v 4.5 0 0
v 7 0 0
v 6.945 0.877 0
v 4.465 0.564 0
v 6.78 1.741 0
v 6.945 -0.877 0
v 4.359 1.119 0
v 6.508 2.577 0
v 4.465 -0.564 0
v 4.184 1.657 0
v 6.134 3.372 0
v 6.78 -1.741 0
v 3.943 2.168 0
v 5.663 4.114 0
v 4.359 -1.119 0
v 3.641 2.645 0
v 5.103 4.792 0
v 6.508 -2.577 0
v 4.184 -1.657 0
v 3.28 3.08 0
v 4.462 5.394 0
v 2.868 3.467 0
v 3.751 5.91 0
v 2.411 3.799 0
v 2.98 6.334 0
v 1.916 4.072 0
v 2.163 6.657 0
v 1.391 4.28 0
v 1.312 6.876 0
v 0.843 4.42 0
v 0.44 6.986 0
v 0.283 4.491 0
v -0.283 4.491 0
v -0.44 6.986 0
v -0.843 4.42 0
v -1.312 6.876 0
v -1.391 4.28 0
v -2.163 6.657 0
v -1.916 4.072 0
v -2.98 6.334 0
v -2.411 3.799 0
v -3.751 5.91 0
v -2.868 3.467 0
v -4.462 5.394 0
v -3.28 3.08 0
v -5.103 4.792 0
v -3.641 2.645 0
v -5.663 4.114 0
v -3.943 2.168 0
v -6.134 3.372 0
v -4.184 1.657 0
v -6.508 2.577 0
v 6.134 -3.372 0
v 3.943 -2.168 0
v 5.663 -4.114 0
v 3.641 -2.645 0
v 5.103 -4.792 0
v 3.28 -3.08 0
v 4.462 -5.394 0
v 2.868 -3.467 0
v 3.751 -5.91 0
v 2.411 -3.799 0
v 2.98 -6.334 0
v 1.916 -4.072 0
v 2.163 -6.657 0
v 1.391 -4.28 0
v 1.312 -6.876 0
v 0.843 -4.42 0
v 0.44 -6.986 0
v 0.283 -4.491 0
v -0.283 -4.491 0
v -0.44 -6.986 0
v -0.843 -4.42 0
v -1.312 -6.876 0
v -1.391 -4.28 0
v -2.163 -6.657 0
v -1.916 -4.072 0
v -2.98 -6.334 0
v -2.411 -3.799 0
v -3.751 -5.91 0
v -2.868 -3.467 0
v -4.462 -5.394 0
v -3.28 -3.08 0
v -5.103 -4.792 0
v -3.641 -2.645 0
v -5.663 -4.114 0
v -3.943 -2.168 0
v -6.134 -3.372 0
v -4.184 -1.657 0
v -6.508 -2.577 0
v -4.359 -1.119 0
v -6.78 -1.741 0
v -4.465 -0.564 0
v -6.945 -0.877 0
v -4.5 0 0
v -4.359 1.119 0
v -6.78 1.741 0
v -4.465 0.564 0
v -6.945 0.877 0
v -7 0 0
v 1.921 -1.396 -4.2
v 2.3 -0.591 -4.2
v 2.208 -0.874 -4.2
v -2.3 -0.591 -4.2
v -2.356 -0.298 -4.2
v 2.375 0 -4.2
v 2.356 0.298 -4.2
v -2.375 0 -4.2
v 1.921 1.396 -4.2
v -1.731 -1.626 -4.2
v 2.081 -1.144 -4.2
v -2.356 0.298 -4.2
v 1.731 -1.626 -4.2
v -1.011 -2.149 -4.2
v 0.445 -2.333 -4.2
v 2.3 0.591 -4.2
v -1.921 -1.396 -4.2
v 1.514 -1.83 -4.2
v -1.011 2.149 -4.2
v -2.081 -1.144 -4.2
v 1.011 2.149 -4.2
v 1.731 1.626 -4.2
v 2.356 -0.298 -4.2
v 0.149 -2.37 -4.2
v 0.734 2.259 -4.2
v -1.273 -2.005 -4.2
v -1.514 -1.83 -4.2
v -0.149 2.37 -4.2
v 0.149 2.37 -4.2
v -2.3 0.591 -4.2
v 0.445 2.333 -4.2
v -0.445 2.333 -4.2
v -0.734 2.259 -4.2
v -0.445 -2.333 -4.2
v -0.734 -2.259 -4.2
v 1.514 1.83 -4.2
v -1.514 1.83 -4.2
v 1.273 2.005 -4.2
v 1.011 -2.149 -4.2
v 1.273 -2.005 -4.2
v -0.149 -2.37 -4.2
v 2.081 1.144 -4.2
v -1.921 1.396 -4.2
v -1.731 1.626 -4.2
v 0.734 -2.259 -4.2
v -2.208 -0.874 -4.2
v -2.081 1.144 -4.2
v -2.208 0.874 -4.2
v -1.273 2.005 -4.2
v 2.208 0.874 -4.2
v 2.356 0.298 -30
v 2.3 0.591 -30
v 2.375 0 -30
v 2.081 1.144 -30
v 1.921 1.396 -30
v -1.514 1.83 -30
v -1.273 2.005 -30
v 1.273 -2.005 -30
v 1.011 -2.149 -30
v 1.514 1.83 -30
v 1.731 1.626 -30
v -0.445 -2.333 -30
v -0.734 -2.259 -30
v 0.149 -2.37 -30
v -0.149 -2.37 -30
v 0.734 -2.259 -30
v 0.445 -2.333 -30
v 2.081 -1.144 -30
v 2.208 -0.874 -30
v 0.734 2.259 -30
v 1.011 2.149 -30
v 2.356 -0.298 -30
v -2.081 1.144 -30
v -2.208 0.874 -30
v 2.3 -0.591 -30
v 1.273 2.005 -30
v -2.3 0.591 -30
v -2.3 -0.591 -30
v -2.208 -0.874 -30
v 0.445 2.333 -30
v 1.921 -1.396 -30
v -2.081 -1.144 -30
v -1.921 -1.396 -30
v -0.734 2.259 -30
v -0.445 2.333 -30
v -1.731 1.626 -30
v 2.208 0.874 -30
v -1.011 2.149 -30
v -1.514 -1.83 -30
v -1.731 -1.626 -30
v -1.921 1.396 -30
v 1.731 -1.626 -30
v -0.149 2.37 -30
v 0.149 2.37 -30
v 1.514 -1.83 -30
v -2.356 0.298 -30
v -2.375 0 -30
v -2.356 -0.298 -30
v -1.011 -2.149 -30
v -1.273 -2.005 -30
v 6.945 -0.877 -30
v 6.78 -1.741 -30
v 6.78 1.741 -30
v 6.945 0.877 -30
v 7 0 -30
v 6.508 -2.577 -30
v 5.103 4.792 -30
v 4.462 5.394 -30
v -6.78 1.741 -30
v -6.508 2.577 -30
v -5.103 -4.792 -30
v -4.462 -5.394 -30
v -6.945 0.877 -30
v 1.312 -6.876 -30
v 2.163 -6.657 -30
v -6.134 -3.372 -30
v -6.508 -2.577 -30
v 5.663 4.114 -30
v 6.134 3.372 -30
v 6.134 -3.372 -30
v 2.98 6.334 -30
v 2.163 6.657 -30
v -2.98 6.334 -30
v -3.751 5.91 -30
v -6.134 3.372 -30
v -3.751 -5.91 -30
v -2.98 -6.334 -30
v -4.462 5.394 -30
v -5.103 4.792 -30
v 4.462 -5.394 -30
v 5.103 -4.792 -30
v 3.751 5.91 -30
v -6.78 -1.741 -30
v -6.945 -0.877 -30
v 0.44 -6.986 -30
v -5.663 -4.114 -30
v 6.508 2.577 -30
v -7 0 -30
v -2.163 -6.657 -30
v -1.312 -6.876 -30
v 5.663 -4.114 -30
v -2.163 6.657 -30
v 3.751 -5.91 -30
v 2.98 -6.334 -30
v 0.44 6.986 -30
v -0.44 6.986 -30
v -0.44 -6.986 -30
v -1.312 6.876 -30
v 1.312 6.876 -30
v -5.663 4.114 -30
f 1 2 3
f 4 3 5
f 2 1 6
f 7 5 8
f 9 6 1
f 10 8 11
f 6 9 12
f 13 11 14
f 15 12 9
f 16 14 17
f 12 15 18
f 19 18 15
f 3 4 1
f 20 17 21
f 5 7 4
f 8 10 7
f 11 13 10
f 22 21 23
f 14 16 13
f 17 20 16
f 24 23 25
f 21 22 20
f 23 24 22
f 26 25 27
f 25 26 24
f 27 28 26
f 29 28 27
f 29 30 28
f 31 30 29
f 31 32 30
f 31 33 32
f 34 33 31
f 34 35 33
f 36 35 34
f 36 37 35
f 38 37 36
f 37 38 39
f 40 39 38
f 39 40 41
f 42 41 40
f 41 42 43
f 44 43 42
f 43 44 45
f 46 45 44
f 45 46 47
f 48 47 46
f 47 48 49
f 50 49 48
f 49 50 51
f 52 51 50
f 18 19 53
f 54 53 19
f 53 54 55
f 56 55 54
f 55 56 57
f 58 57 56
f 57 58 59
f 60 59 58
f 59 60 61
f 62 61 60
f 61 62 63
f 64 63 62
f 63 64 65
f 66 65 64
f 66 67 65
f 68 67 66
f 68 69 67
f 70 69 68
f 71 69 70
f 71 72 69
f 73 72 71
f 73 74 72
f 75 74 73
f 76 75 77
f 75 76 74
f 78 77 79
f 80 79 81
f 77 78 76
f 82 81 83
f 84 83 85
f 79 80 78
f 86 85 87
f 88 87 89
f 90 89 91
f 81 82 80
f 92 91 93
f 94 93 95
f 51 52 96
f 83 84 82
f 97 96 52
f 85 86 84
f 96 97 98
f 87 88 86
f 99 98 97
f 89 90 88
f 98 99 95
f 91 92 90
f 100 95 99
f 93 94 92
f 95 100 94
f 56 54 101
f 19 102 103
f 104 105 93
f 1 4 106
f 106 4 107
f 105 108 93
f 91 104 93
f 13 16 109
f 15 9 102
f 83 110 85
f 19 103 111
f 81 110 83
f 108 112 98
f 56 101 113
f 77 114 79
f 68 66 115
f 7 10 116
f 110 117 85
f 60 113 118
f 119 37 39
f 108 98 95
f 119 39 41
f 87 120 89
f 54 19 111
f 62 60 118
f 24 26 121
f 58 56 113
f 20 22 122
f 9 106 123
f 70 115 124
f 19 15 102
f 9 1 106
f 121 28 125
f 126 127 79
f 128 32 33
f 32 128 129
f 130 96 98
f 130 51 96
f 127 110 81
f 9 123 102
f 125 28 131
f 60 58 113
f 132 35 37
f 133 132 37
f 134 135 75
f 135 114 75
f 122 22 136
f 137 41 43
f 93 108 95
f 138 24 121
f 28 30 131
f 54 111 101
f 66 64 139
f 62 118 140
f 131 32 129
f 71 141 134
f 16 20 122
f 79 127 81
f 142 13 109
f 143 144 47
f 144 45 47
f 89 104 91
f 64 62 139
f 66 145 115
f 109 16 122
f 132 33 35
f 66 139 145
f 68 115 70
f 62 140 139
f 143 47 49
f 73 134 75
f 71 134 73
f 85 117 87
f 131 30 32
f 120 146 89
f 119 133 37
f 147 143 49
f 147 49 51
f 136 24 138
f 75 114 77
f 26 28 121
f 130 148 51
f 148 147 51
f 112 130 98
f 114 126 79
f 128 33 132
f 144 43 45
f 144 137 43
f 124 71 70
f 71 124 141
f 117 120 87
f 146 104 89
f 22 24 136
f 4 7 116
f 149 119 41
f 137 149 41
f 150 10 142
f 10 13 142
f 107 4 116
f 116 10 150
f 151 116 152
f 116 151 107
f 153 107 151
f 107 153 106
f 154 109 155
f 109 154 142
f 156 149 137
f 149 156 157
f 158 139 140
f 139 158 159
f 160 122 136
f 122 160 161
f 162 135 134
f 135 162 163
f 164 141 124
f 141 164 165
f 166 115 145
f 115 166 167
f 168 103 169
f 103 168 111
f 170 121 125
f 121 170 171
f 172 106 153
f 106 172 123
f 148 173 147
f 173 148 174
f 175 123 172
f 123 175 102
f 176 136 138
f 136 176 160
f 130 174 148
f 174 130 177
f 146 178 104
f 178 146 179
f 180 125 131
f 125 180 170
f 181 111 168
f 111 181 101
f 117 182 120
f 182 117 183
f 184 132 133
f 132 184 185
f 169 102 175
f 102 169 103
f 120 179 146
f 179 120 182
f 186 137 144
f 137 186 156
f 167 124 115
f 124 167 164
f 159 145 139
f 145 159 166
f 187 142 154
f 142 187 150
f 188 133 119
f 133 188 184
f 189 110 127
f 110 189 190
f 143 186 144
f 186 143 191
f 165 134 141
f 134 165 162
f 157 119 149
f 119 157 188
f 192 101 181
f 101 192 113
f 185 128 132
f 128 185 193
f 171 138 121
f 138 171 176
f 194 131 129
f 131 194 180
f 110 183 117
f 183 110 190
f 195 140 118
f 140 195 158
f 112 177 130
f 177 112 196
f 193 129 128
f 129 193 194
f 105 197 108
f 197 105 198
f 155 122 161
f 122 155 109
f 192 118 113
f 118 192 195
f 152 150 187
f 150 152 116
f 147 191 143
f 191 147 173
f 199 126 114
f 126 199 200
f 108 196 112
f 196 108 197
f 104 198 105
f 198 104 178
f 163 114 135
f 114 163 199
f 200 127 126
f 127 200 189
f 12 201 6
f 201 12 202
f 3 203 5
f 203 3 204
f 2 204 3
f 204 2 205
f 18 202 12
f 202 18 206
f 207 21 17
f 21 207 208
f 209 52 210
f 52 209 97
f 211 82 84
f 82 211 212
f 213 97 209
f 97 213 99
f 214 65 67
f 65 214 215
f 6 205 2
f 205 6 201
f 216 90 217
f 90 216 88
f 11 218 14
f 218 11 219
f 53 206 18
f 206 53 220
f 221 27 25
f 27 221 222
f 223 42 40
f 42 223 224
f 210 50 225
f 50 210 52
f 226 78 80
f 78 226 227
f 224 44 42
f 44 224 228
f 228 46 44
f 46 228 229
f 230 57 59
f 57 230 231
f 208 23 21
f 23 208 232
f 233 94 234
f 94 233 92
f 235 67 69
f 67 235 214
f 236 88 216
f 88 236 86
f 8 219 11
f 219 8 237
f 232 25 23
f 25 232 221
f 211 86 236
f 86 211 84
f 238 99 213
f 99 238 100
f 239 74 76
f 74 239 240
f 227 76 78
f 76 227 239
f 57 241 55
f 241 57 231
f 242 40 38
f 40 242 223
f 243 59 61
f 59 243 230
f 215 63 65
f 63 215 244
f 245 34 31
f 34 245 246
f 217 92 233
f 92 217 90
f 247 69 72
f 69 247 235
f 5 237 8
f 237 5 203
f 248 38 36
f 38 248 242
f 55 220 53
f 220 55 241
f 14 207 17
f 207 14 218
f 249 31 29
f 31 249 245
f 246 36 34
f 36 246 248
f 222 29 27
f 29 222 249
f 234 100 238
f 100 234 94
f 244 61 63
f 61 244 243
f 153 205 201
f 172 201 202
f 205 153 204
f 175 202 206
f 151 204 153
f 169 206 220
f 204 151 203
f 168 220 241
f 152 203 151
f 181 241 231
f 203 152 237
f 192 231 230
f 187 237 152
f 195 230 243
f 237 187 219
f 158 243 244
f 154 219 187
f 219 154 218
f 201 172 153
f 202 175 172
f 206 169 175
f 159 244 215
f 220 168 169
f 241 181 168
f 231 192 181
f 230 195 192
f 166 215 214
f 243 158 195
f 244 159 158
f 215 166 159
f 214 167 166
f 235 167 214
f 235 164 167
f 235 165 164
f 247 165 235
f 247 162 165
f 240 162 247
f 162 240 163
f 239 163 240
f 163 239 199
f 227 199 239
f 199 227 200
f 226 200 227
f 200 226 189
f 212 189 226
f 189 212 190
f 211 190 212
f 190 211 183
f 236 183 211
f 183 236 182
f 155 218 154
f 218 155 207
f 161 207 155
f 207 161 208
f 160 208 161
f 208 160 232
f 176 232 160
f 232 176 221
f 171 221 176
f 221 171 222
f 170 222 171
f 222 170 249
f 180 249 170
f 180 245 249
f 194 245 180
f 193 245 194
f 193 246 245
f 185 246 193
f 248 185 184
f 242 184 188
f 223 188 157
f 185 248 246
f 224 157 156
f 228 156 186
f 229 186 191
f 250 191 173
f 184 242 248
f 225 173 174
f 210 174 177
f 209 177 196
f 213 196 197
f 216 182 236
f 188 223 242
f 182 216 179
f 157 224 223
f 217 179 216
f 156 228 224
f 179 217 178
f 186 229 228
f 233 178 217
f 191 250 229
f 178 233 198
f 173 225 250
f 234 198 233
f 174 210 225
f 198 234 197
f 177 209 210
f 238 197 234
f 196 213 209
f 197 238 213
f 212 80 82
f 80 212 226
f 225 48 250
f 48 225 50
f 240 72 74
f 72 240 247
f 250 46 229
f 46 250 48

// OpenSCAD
$fn = 50;

difference() {
	union() {
		translate(v = [0, 0, -30.0]) {
			cylinder(h = 30, r = 7.0);
		}
	}
	union() {
		translate(v = [0, 0, 0]) {
			rotate(a = [0, 0, 0]) {
				difference() {
					union() {
						translate(v = [0, 0, -33.0]) {
							cylinder(h = 33, r = 2.25);
						}
						translate(v = [0, 0, -4.2]) {
							cylinder(h = 4.2, r1 = 2.375, r2 = 4.5);
						}
						translate(v = [0, 0, -33.0]) {
							cylinder(h = 33, r = 2.375);
						}
						translate(v = [0, 0, -33.0]) {
							cylinder(h = 33, r = 2.25);
						}
					}
					union();
				}
			}
		}
	}
}
